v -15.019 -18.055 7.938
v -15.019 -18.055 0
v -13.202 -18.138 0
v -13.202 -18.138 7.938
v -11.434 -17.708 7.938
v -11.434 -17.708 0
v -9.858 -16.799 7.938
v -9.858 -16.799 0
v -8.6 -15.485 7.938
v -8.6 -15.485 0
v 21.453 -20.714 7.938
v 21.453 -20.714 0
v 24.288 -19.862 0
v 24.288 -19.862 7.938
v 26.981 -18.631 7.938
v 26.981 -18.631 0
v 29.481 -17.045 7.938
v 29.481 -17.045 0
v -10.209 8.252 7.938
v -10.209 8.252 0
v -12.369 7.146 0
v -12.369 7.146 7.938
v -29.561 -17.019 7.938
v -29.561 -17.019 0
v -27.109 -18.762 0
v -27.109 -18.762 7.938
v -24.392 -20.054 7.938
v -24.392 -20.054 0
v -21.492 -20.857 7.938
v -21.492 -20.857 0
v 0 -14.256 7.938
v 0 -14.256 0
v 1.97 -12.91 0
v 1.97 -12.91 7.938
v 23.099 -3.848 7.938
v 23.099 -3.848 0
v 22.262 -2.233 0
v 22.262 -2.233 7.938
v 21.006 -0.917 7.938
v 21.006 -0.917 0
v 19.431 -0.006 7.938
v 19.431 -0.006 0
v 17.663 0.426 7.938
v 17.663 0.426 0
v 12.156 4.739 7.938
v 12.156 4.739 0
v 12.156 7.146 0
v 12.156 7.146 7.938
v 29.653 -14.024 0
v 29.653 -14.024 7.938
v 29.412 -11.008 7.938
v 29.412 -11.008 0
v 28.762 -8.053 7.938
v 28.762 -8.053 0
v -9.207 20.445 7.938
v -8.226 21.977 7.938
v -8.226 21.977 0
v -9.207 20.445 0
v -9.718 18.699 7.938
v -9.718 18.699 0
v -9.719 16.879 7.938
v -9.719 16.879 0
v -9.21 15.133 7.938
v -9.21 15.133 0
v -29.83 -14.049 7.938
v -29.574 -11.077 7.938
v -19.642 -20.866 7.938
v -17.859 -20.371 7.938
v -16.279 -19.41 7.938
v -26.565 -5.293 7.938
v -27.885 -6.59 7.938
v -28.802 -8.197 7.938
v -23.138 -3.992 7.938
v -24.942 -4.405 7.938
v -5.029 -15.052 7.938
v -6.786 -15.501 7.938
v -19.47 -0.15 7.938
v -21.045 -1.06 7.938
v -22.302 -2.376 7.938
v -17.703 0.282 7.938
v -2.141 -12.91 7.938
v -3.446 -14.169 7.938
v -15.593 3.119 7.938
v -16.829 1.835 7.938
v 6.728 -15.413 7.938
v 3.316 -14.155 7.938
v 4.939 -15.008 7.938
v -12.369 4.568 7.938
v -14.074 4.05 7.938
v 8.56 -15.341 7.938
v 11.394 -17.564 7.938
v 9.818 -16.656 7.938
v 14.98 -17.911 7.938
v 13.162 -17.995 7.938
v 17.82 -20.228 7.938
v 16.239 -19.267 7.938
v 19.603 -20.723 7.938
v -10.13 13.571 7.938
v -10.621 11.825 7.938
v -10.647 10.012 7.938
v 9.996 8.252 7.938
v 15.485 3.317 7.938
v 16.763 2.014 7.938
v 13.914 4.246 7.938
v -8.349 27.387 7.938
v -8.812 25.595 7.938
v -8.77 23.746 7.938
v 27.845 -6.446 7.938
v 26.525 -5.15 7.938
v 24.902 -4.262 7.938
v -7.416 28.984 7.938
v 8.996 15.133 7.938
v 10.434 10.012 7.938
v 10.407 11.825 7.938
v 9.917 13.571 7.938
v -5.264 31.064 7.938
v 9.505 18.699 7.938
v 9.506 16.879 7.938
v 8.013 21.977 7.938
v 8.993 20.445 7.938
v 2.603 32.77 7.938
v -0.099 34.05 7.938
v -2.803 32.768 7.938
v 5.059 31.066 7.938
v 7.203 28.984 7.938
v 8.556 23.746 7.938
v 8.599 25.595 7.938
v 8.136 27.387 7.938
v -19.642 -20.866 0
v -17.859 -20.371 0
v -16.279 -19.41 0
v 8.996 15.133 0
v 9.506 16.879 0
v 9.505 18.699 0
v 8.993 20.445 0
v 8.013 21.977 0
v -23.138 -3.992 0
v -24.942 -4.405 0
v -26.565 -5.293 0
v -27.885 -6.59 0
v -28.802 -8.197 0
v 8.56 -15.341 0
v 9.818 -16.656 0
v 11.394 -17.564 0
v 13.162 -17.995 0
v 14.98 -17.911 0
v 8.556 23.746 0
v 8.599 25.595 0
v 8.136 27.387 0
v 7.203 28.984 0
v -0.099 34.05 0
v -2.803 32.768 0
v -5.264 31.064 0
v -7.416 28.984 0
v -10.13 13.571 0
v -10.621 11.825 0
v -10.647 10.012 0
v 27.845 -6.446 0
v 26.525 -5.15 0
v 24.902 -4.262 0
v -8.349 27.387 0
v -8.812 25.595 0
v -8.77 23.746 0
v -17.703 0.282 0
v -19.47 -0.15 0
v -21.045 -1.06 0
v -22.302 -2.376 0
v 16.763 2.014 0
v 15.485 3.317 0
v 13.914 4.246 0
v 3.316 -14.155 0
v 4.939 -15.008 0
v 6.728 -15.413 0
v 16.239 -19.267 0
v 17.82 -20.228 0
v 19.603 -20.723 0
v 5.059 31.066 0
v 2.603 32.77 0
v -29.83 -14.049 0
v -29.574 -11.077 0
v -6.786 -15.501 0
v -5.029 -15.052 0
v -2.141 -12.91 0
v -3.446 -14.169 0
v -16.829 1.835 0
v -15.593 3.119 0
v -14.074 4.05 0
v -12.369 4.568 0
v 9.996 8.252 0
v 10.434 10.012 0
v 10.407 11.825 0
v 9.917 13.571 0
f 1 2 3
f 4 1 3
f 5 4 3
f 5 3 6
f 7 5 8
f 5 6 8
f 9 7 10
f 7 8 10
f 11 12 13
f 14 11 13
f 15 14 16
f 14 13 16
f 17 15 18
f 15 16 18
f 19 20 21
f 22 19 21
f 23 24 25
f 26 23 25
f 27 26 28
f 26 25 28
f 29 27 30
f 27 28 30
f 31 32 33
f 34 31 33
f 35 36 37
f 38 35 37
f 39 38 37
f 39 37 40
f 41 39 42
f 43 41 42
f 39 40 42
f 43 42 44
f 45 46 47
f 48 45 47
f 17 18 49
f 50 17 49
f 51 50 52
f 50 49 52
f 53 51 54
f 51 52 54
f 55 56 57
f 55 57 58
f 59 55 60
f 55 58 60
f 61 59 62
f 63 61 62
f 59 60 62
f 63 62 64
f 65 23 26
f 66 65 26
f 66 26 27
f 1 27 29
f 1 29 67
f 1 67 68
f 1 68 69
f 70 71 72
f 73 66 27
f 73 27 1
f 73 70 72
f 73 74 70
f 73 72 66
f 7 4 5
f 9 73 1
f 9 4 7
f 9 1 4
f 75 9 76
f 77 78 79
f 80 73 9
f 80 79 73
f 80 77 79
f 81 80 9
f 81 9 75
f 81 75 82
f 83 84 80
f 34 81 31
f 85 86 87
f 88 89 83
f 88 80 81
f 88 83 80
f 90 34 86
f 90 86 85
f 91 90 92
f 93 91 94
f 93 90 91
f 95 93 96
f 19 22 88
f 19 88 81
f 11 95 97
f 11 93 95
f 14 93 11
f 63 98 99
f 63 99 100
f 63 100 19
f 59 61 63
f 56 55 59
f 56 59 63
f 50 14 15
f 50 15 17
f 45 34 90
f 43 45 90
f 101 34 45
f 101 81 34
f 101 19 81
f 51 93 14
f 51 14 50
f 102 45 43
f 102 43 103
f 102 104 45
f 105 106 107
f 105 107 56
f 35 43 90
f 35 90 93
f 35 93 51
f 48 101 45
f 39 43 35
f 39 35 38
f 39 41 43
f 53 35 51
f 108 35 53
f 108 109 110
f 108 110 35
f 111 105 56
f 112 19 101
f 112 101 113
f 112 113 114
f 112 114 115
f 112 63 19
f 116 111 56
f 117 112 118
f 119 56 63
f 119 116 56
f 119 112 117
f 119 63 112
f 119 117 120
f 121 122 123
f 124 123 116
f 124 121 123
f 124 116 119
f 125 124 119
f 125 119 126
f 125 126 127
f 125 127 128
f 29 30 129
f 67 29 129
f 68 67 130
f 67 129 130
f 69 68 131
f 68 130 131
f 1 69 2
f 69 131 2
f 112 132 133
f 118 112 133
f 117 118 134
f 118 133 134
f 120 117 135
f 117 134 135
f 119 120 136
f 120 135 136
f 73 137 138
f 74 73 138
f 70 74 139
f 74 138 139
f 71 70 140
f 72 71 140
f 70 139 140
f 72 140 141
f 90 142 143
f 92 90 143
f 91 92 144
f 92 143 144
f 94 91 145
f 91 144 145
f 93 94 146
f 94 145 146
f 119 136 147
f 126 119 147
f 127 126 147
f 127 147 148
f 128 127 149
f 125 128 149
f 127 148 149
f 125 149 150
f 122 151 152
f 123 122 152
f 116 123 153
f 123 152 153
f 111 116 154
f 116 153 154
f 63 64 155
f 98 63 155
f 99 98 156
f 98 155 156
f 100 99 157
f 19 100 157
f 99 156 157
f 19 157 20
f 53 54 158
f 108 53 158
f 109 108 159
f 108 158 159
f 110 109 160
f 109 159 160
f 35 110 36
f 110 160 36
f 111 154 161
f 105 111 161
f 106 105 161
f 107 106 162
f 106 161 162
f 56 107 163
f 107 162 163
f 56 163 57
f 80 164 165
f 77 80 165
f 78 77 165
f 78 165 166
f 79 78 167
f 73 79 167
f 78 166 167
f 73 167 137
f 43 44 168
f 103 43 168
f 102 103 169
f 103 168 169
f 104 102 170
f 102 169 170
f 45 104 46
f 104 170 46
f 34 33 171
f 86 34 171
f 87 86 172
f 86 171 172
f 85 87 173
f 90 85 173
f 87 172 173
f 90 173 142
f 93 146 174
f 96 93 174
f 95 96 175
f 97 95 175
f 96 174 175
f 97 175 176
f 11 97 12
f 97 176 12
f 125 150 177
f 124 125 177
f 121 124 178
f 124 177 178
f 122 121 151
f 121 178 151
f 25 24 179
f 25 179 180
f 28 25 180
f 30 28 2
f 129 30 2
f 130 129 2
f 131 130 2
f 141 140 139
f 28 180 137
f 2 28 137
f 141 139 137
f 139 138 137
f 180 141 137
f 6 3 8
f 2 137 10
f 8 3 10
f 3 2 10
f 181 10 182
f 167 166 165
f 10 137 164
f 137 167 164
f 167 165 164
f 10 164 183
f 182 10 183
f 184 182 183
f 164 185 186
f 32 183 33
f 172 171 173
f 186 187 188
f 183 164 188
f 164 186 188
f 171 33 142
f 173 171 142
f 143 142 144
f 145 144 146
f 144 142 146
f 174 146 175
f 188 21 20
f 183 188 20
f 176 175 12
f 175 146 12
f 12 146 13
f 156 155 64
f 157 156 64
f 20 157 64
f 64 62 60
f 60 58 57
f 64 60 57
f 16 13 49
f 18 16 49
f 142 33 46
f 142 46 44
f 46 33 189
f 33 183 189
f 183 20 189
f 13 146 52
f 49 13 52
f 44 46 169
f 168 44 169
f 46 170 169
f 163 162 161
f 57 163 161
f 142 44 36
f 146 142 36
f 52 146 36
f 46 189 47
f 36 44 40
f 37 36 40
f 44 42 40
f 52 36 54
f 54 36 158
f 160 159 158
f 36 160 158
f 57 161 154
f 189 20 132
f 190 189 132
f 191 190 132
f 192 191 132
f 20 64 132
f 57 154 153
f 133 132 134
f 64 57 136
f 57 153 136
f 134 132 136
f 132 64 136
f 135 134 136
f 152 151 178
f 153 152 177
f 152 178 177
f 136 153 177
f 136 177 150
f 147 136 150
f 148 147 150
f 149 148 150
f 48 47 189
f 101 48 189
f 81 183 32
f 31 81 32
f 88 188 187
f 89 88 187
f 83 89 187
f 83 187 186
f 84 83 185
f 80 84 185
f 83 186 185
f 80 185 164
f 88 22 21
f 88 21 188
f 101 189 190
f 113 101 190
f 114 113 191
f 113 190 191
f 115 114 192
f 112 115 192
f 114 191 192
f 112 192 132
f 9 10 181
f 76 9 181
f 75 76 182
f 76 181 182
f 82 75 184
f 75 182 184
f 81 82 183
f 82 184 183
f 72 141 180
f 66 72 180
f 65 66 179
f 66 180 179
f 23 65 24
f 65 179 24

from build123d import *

# Parameters (mm, degrees)
F1_DEPTH = 7.9375


# Not quite as in the source:
# - a length typed as a fraction of an inch, garbled in the dataset ("3 / 203.2 mm" for 3/8 in), is restored


with BuildPart() as f1:
    # F0 (on Top) → F1 (new body)
    with BuildSketch(Plane.XY):
        with BuildLine():
            ThreePointArc((-0.0986067535, 34.0497419238), (-4.0682176485, 31.9659465467), (-7.4162920937, 28.9842672646))
            ThreePointArc((-7.4162920937, 28.9842672646), (-8.8119305122, 25.5953281623), (-8.2258973271, 21.977417171))
            ThreePointArc((-8.2258973271, 21.977417171), (-9.7181261566, 18.698842434), (-9.2097157612, 15.1327075437))
            ThreePointArc((-9.2097157612, 15.1327075437), (-10.6205392688, 11.8246856933), (-10.2093555033, 8.2519613206))
            Line((-10.2093555033, 8.2519613206), (-12.369341217, 7.1464567445))
            Line((-12.369341217, 7.1464567445), (-12.369341217, 4.6386048198))
            Line((-12.369341217, 4.6386048198), (-12.369341217, 4.5682978211))
            ThreePointArc((-12.369341217, 4.5682978211), (-15.5930977879, 3.1185654947), (-17.7027139134, 0.2823972963))
            ThreePointArc((-17.7027139134, 0.2823972963), (-21.0452825194, -1.0603738309), (-23.1384971151, -3.9919692741))
            ThreePointArc((-23.1384971151, -3.9919692741), (-26.5647165348, -5.2934051439), (-28.80180468, -8.19653302))
            ThreePointArc((-28.80180468, -8.19653302), (-29.7673344436, -12.5572908836), (-29.5614041388, -17.0189104974))
            ThreePointArc((-29.5614041388, -17.0189104974), (-25.7783661022, -19.4669407743), (-21.4921734029, -20.8571857766))
            ThreePointArc((-21.4921734029, -20.8571857766), (-17.8594468391, -20.3713745504), (-15.0192606046, -18.054899429))
            ThreePointArc((-15.0192606046, -18.054899429), (-11.4338171794, -17.7079201351), (-8.5996589687, -15.484556372))
            ThreePointArc((-8.5996589687, -15.484556372), (-5.0294162563, -15.0523544446), (-2.1409380715, -12.9098966718))
            Line((-2.1409380715, -12.9098966718), (0, -14.2561570176))
            Line((0, -14.2561570176), (1.9696742658, -12.9098966718))
            ThreePointArc((1.9696742658, -12.9098966718), (4.9392756736, -15.0084468105), (8.560301624, -15.3410370587))
            ThreePointArc((8.560301624, -15.3410370587), (11.3944598347, -17.5644008218), (14.9799032599, -17.9113801157))
            ThreePointArc((14.9799032599, -17.9113801157), (17.8200894944, -20.2278552371), (21.4528160582, -20.7136664634))
            ThreePointArc((21.4528160582, -20.7136664634), (25.6558468929, -19.2922500665), (29.4813849032, -17.0447733253))
            ThreePointArc((29.4813849032, -17.0447733253), (29.5836204245, -12.511977875), (28.7624473353, -8.0530137067))
            ThreePointArc((28.7624473353, -8.0530137067), (26.5253591901, -5.1498858306), (23.0991397704, -3.8484499608))
            ThreePointArc((23.0991397704, -3.8484499608), (21.0059251747, -0.9168545176), (17.6633565687, 0.4259166096))
            ThreePointArc((17.6633565687, 0.4259166096), (15.4847616458, 3.3168082822), (12.1560195839, 4.739132713))
            Line((12.1560195839, 4.739132713), (12.1560195839, 7.1464567445))
            Line((12.1560195839, 7.1464567445), (9.9960338703, 8.2519613206))
            ThreePointArc((9.9960338703, 8.2519613206), (10.4072176357, 11.8246856933), (8.9963941282, 15.1327075437))
            ThreePointArc((8.9963941282, 15.1327075437), (9.5048045235, 18.698842434), (8.012575694, 21.977417171))
            ThreePointArc((8.012575694, 21.977417171), (8.5986088792, 25.5953281623), (7.2029704606, 28.9842672646))
            ThreePointArc((7.2029704606, 28.9842672646), (3.8655773676, 31.9687453881), (-0.0986067535, 34.0497419238))
        make_face()
    extrude(amount=F1_DEPTH)


solid = f1.part
